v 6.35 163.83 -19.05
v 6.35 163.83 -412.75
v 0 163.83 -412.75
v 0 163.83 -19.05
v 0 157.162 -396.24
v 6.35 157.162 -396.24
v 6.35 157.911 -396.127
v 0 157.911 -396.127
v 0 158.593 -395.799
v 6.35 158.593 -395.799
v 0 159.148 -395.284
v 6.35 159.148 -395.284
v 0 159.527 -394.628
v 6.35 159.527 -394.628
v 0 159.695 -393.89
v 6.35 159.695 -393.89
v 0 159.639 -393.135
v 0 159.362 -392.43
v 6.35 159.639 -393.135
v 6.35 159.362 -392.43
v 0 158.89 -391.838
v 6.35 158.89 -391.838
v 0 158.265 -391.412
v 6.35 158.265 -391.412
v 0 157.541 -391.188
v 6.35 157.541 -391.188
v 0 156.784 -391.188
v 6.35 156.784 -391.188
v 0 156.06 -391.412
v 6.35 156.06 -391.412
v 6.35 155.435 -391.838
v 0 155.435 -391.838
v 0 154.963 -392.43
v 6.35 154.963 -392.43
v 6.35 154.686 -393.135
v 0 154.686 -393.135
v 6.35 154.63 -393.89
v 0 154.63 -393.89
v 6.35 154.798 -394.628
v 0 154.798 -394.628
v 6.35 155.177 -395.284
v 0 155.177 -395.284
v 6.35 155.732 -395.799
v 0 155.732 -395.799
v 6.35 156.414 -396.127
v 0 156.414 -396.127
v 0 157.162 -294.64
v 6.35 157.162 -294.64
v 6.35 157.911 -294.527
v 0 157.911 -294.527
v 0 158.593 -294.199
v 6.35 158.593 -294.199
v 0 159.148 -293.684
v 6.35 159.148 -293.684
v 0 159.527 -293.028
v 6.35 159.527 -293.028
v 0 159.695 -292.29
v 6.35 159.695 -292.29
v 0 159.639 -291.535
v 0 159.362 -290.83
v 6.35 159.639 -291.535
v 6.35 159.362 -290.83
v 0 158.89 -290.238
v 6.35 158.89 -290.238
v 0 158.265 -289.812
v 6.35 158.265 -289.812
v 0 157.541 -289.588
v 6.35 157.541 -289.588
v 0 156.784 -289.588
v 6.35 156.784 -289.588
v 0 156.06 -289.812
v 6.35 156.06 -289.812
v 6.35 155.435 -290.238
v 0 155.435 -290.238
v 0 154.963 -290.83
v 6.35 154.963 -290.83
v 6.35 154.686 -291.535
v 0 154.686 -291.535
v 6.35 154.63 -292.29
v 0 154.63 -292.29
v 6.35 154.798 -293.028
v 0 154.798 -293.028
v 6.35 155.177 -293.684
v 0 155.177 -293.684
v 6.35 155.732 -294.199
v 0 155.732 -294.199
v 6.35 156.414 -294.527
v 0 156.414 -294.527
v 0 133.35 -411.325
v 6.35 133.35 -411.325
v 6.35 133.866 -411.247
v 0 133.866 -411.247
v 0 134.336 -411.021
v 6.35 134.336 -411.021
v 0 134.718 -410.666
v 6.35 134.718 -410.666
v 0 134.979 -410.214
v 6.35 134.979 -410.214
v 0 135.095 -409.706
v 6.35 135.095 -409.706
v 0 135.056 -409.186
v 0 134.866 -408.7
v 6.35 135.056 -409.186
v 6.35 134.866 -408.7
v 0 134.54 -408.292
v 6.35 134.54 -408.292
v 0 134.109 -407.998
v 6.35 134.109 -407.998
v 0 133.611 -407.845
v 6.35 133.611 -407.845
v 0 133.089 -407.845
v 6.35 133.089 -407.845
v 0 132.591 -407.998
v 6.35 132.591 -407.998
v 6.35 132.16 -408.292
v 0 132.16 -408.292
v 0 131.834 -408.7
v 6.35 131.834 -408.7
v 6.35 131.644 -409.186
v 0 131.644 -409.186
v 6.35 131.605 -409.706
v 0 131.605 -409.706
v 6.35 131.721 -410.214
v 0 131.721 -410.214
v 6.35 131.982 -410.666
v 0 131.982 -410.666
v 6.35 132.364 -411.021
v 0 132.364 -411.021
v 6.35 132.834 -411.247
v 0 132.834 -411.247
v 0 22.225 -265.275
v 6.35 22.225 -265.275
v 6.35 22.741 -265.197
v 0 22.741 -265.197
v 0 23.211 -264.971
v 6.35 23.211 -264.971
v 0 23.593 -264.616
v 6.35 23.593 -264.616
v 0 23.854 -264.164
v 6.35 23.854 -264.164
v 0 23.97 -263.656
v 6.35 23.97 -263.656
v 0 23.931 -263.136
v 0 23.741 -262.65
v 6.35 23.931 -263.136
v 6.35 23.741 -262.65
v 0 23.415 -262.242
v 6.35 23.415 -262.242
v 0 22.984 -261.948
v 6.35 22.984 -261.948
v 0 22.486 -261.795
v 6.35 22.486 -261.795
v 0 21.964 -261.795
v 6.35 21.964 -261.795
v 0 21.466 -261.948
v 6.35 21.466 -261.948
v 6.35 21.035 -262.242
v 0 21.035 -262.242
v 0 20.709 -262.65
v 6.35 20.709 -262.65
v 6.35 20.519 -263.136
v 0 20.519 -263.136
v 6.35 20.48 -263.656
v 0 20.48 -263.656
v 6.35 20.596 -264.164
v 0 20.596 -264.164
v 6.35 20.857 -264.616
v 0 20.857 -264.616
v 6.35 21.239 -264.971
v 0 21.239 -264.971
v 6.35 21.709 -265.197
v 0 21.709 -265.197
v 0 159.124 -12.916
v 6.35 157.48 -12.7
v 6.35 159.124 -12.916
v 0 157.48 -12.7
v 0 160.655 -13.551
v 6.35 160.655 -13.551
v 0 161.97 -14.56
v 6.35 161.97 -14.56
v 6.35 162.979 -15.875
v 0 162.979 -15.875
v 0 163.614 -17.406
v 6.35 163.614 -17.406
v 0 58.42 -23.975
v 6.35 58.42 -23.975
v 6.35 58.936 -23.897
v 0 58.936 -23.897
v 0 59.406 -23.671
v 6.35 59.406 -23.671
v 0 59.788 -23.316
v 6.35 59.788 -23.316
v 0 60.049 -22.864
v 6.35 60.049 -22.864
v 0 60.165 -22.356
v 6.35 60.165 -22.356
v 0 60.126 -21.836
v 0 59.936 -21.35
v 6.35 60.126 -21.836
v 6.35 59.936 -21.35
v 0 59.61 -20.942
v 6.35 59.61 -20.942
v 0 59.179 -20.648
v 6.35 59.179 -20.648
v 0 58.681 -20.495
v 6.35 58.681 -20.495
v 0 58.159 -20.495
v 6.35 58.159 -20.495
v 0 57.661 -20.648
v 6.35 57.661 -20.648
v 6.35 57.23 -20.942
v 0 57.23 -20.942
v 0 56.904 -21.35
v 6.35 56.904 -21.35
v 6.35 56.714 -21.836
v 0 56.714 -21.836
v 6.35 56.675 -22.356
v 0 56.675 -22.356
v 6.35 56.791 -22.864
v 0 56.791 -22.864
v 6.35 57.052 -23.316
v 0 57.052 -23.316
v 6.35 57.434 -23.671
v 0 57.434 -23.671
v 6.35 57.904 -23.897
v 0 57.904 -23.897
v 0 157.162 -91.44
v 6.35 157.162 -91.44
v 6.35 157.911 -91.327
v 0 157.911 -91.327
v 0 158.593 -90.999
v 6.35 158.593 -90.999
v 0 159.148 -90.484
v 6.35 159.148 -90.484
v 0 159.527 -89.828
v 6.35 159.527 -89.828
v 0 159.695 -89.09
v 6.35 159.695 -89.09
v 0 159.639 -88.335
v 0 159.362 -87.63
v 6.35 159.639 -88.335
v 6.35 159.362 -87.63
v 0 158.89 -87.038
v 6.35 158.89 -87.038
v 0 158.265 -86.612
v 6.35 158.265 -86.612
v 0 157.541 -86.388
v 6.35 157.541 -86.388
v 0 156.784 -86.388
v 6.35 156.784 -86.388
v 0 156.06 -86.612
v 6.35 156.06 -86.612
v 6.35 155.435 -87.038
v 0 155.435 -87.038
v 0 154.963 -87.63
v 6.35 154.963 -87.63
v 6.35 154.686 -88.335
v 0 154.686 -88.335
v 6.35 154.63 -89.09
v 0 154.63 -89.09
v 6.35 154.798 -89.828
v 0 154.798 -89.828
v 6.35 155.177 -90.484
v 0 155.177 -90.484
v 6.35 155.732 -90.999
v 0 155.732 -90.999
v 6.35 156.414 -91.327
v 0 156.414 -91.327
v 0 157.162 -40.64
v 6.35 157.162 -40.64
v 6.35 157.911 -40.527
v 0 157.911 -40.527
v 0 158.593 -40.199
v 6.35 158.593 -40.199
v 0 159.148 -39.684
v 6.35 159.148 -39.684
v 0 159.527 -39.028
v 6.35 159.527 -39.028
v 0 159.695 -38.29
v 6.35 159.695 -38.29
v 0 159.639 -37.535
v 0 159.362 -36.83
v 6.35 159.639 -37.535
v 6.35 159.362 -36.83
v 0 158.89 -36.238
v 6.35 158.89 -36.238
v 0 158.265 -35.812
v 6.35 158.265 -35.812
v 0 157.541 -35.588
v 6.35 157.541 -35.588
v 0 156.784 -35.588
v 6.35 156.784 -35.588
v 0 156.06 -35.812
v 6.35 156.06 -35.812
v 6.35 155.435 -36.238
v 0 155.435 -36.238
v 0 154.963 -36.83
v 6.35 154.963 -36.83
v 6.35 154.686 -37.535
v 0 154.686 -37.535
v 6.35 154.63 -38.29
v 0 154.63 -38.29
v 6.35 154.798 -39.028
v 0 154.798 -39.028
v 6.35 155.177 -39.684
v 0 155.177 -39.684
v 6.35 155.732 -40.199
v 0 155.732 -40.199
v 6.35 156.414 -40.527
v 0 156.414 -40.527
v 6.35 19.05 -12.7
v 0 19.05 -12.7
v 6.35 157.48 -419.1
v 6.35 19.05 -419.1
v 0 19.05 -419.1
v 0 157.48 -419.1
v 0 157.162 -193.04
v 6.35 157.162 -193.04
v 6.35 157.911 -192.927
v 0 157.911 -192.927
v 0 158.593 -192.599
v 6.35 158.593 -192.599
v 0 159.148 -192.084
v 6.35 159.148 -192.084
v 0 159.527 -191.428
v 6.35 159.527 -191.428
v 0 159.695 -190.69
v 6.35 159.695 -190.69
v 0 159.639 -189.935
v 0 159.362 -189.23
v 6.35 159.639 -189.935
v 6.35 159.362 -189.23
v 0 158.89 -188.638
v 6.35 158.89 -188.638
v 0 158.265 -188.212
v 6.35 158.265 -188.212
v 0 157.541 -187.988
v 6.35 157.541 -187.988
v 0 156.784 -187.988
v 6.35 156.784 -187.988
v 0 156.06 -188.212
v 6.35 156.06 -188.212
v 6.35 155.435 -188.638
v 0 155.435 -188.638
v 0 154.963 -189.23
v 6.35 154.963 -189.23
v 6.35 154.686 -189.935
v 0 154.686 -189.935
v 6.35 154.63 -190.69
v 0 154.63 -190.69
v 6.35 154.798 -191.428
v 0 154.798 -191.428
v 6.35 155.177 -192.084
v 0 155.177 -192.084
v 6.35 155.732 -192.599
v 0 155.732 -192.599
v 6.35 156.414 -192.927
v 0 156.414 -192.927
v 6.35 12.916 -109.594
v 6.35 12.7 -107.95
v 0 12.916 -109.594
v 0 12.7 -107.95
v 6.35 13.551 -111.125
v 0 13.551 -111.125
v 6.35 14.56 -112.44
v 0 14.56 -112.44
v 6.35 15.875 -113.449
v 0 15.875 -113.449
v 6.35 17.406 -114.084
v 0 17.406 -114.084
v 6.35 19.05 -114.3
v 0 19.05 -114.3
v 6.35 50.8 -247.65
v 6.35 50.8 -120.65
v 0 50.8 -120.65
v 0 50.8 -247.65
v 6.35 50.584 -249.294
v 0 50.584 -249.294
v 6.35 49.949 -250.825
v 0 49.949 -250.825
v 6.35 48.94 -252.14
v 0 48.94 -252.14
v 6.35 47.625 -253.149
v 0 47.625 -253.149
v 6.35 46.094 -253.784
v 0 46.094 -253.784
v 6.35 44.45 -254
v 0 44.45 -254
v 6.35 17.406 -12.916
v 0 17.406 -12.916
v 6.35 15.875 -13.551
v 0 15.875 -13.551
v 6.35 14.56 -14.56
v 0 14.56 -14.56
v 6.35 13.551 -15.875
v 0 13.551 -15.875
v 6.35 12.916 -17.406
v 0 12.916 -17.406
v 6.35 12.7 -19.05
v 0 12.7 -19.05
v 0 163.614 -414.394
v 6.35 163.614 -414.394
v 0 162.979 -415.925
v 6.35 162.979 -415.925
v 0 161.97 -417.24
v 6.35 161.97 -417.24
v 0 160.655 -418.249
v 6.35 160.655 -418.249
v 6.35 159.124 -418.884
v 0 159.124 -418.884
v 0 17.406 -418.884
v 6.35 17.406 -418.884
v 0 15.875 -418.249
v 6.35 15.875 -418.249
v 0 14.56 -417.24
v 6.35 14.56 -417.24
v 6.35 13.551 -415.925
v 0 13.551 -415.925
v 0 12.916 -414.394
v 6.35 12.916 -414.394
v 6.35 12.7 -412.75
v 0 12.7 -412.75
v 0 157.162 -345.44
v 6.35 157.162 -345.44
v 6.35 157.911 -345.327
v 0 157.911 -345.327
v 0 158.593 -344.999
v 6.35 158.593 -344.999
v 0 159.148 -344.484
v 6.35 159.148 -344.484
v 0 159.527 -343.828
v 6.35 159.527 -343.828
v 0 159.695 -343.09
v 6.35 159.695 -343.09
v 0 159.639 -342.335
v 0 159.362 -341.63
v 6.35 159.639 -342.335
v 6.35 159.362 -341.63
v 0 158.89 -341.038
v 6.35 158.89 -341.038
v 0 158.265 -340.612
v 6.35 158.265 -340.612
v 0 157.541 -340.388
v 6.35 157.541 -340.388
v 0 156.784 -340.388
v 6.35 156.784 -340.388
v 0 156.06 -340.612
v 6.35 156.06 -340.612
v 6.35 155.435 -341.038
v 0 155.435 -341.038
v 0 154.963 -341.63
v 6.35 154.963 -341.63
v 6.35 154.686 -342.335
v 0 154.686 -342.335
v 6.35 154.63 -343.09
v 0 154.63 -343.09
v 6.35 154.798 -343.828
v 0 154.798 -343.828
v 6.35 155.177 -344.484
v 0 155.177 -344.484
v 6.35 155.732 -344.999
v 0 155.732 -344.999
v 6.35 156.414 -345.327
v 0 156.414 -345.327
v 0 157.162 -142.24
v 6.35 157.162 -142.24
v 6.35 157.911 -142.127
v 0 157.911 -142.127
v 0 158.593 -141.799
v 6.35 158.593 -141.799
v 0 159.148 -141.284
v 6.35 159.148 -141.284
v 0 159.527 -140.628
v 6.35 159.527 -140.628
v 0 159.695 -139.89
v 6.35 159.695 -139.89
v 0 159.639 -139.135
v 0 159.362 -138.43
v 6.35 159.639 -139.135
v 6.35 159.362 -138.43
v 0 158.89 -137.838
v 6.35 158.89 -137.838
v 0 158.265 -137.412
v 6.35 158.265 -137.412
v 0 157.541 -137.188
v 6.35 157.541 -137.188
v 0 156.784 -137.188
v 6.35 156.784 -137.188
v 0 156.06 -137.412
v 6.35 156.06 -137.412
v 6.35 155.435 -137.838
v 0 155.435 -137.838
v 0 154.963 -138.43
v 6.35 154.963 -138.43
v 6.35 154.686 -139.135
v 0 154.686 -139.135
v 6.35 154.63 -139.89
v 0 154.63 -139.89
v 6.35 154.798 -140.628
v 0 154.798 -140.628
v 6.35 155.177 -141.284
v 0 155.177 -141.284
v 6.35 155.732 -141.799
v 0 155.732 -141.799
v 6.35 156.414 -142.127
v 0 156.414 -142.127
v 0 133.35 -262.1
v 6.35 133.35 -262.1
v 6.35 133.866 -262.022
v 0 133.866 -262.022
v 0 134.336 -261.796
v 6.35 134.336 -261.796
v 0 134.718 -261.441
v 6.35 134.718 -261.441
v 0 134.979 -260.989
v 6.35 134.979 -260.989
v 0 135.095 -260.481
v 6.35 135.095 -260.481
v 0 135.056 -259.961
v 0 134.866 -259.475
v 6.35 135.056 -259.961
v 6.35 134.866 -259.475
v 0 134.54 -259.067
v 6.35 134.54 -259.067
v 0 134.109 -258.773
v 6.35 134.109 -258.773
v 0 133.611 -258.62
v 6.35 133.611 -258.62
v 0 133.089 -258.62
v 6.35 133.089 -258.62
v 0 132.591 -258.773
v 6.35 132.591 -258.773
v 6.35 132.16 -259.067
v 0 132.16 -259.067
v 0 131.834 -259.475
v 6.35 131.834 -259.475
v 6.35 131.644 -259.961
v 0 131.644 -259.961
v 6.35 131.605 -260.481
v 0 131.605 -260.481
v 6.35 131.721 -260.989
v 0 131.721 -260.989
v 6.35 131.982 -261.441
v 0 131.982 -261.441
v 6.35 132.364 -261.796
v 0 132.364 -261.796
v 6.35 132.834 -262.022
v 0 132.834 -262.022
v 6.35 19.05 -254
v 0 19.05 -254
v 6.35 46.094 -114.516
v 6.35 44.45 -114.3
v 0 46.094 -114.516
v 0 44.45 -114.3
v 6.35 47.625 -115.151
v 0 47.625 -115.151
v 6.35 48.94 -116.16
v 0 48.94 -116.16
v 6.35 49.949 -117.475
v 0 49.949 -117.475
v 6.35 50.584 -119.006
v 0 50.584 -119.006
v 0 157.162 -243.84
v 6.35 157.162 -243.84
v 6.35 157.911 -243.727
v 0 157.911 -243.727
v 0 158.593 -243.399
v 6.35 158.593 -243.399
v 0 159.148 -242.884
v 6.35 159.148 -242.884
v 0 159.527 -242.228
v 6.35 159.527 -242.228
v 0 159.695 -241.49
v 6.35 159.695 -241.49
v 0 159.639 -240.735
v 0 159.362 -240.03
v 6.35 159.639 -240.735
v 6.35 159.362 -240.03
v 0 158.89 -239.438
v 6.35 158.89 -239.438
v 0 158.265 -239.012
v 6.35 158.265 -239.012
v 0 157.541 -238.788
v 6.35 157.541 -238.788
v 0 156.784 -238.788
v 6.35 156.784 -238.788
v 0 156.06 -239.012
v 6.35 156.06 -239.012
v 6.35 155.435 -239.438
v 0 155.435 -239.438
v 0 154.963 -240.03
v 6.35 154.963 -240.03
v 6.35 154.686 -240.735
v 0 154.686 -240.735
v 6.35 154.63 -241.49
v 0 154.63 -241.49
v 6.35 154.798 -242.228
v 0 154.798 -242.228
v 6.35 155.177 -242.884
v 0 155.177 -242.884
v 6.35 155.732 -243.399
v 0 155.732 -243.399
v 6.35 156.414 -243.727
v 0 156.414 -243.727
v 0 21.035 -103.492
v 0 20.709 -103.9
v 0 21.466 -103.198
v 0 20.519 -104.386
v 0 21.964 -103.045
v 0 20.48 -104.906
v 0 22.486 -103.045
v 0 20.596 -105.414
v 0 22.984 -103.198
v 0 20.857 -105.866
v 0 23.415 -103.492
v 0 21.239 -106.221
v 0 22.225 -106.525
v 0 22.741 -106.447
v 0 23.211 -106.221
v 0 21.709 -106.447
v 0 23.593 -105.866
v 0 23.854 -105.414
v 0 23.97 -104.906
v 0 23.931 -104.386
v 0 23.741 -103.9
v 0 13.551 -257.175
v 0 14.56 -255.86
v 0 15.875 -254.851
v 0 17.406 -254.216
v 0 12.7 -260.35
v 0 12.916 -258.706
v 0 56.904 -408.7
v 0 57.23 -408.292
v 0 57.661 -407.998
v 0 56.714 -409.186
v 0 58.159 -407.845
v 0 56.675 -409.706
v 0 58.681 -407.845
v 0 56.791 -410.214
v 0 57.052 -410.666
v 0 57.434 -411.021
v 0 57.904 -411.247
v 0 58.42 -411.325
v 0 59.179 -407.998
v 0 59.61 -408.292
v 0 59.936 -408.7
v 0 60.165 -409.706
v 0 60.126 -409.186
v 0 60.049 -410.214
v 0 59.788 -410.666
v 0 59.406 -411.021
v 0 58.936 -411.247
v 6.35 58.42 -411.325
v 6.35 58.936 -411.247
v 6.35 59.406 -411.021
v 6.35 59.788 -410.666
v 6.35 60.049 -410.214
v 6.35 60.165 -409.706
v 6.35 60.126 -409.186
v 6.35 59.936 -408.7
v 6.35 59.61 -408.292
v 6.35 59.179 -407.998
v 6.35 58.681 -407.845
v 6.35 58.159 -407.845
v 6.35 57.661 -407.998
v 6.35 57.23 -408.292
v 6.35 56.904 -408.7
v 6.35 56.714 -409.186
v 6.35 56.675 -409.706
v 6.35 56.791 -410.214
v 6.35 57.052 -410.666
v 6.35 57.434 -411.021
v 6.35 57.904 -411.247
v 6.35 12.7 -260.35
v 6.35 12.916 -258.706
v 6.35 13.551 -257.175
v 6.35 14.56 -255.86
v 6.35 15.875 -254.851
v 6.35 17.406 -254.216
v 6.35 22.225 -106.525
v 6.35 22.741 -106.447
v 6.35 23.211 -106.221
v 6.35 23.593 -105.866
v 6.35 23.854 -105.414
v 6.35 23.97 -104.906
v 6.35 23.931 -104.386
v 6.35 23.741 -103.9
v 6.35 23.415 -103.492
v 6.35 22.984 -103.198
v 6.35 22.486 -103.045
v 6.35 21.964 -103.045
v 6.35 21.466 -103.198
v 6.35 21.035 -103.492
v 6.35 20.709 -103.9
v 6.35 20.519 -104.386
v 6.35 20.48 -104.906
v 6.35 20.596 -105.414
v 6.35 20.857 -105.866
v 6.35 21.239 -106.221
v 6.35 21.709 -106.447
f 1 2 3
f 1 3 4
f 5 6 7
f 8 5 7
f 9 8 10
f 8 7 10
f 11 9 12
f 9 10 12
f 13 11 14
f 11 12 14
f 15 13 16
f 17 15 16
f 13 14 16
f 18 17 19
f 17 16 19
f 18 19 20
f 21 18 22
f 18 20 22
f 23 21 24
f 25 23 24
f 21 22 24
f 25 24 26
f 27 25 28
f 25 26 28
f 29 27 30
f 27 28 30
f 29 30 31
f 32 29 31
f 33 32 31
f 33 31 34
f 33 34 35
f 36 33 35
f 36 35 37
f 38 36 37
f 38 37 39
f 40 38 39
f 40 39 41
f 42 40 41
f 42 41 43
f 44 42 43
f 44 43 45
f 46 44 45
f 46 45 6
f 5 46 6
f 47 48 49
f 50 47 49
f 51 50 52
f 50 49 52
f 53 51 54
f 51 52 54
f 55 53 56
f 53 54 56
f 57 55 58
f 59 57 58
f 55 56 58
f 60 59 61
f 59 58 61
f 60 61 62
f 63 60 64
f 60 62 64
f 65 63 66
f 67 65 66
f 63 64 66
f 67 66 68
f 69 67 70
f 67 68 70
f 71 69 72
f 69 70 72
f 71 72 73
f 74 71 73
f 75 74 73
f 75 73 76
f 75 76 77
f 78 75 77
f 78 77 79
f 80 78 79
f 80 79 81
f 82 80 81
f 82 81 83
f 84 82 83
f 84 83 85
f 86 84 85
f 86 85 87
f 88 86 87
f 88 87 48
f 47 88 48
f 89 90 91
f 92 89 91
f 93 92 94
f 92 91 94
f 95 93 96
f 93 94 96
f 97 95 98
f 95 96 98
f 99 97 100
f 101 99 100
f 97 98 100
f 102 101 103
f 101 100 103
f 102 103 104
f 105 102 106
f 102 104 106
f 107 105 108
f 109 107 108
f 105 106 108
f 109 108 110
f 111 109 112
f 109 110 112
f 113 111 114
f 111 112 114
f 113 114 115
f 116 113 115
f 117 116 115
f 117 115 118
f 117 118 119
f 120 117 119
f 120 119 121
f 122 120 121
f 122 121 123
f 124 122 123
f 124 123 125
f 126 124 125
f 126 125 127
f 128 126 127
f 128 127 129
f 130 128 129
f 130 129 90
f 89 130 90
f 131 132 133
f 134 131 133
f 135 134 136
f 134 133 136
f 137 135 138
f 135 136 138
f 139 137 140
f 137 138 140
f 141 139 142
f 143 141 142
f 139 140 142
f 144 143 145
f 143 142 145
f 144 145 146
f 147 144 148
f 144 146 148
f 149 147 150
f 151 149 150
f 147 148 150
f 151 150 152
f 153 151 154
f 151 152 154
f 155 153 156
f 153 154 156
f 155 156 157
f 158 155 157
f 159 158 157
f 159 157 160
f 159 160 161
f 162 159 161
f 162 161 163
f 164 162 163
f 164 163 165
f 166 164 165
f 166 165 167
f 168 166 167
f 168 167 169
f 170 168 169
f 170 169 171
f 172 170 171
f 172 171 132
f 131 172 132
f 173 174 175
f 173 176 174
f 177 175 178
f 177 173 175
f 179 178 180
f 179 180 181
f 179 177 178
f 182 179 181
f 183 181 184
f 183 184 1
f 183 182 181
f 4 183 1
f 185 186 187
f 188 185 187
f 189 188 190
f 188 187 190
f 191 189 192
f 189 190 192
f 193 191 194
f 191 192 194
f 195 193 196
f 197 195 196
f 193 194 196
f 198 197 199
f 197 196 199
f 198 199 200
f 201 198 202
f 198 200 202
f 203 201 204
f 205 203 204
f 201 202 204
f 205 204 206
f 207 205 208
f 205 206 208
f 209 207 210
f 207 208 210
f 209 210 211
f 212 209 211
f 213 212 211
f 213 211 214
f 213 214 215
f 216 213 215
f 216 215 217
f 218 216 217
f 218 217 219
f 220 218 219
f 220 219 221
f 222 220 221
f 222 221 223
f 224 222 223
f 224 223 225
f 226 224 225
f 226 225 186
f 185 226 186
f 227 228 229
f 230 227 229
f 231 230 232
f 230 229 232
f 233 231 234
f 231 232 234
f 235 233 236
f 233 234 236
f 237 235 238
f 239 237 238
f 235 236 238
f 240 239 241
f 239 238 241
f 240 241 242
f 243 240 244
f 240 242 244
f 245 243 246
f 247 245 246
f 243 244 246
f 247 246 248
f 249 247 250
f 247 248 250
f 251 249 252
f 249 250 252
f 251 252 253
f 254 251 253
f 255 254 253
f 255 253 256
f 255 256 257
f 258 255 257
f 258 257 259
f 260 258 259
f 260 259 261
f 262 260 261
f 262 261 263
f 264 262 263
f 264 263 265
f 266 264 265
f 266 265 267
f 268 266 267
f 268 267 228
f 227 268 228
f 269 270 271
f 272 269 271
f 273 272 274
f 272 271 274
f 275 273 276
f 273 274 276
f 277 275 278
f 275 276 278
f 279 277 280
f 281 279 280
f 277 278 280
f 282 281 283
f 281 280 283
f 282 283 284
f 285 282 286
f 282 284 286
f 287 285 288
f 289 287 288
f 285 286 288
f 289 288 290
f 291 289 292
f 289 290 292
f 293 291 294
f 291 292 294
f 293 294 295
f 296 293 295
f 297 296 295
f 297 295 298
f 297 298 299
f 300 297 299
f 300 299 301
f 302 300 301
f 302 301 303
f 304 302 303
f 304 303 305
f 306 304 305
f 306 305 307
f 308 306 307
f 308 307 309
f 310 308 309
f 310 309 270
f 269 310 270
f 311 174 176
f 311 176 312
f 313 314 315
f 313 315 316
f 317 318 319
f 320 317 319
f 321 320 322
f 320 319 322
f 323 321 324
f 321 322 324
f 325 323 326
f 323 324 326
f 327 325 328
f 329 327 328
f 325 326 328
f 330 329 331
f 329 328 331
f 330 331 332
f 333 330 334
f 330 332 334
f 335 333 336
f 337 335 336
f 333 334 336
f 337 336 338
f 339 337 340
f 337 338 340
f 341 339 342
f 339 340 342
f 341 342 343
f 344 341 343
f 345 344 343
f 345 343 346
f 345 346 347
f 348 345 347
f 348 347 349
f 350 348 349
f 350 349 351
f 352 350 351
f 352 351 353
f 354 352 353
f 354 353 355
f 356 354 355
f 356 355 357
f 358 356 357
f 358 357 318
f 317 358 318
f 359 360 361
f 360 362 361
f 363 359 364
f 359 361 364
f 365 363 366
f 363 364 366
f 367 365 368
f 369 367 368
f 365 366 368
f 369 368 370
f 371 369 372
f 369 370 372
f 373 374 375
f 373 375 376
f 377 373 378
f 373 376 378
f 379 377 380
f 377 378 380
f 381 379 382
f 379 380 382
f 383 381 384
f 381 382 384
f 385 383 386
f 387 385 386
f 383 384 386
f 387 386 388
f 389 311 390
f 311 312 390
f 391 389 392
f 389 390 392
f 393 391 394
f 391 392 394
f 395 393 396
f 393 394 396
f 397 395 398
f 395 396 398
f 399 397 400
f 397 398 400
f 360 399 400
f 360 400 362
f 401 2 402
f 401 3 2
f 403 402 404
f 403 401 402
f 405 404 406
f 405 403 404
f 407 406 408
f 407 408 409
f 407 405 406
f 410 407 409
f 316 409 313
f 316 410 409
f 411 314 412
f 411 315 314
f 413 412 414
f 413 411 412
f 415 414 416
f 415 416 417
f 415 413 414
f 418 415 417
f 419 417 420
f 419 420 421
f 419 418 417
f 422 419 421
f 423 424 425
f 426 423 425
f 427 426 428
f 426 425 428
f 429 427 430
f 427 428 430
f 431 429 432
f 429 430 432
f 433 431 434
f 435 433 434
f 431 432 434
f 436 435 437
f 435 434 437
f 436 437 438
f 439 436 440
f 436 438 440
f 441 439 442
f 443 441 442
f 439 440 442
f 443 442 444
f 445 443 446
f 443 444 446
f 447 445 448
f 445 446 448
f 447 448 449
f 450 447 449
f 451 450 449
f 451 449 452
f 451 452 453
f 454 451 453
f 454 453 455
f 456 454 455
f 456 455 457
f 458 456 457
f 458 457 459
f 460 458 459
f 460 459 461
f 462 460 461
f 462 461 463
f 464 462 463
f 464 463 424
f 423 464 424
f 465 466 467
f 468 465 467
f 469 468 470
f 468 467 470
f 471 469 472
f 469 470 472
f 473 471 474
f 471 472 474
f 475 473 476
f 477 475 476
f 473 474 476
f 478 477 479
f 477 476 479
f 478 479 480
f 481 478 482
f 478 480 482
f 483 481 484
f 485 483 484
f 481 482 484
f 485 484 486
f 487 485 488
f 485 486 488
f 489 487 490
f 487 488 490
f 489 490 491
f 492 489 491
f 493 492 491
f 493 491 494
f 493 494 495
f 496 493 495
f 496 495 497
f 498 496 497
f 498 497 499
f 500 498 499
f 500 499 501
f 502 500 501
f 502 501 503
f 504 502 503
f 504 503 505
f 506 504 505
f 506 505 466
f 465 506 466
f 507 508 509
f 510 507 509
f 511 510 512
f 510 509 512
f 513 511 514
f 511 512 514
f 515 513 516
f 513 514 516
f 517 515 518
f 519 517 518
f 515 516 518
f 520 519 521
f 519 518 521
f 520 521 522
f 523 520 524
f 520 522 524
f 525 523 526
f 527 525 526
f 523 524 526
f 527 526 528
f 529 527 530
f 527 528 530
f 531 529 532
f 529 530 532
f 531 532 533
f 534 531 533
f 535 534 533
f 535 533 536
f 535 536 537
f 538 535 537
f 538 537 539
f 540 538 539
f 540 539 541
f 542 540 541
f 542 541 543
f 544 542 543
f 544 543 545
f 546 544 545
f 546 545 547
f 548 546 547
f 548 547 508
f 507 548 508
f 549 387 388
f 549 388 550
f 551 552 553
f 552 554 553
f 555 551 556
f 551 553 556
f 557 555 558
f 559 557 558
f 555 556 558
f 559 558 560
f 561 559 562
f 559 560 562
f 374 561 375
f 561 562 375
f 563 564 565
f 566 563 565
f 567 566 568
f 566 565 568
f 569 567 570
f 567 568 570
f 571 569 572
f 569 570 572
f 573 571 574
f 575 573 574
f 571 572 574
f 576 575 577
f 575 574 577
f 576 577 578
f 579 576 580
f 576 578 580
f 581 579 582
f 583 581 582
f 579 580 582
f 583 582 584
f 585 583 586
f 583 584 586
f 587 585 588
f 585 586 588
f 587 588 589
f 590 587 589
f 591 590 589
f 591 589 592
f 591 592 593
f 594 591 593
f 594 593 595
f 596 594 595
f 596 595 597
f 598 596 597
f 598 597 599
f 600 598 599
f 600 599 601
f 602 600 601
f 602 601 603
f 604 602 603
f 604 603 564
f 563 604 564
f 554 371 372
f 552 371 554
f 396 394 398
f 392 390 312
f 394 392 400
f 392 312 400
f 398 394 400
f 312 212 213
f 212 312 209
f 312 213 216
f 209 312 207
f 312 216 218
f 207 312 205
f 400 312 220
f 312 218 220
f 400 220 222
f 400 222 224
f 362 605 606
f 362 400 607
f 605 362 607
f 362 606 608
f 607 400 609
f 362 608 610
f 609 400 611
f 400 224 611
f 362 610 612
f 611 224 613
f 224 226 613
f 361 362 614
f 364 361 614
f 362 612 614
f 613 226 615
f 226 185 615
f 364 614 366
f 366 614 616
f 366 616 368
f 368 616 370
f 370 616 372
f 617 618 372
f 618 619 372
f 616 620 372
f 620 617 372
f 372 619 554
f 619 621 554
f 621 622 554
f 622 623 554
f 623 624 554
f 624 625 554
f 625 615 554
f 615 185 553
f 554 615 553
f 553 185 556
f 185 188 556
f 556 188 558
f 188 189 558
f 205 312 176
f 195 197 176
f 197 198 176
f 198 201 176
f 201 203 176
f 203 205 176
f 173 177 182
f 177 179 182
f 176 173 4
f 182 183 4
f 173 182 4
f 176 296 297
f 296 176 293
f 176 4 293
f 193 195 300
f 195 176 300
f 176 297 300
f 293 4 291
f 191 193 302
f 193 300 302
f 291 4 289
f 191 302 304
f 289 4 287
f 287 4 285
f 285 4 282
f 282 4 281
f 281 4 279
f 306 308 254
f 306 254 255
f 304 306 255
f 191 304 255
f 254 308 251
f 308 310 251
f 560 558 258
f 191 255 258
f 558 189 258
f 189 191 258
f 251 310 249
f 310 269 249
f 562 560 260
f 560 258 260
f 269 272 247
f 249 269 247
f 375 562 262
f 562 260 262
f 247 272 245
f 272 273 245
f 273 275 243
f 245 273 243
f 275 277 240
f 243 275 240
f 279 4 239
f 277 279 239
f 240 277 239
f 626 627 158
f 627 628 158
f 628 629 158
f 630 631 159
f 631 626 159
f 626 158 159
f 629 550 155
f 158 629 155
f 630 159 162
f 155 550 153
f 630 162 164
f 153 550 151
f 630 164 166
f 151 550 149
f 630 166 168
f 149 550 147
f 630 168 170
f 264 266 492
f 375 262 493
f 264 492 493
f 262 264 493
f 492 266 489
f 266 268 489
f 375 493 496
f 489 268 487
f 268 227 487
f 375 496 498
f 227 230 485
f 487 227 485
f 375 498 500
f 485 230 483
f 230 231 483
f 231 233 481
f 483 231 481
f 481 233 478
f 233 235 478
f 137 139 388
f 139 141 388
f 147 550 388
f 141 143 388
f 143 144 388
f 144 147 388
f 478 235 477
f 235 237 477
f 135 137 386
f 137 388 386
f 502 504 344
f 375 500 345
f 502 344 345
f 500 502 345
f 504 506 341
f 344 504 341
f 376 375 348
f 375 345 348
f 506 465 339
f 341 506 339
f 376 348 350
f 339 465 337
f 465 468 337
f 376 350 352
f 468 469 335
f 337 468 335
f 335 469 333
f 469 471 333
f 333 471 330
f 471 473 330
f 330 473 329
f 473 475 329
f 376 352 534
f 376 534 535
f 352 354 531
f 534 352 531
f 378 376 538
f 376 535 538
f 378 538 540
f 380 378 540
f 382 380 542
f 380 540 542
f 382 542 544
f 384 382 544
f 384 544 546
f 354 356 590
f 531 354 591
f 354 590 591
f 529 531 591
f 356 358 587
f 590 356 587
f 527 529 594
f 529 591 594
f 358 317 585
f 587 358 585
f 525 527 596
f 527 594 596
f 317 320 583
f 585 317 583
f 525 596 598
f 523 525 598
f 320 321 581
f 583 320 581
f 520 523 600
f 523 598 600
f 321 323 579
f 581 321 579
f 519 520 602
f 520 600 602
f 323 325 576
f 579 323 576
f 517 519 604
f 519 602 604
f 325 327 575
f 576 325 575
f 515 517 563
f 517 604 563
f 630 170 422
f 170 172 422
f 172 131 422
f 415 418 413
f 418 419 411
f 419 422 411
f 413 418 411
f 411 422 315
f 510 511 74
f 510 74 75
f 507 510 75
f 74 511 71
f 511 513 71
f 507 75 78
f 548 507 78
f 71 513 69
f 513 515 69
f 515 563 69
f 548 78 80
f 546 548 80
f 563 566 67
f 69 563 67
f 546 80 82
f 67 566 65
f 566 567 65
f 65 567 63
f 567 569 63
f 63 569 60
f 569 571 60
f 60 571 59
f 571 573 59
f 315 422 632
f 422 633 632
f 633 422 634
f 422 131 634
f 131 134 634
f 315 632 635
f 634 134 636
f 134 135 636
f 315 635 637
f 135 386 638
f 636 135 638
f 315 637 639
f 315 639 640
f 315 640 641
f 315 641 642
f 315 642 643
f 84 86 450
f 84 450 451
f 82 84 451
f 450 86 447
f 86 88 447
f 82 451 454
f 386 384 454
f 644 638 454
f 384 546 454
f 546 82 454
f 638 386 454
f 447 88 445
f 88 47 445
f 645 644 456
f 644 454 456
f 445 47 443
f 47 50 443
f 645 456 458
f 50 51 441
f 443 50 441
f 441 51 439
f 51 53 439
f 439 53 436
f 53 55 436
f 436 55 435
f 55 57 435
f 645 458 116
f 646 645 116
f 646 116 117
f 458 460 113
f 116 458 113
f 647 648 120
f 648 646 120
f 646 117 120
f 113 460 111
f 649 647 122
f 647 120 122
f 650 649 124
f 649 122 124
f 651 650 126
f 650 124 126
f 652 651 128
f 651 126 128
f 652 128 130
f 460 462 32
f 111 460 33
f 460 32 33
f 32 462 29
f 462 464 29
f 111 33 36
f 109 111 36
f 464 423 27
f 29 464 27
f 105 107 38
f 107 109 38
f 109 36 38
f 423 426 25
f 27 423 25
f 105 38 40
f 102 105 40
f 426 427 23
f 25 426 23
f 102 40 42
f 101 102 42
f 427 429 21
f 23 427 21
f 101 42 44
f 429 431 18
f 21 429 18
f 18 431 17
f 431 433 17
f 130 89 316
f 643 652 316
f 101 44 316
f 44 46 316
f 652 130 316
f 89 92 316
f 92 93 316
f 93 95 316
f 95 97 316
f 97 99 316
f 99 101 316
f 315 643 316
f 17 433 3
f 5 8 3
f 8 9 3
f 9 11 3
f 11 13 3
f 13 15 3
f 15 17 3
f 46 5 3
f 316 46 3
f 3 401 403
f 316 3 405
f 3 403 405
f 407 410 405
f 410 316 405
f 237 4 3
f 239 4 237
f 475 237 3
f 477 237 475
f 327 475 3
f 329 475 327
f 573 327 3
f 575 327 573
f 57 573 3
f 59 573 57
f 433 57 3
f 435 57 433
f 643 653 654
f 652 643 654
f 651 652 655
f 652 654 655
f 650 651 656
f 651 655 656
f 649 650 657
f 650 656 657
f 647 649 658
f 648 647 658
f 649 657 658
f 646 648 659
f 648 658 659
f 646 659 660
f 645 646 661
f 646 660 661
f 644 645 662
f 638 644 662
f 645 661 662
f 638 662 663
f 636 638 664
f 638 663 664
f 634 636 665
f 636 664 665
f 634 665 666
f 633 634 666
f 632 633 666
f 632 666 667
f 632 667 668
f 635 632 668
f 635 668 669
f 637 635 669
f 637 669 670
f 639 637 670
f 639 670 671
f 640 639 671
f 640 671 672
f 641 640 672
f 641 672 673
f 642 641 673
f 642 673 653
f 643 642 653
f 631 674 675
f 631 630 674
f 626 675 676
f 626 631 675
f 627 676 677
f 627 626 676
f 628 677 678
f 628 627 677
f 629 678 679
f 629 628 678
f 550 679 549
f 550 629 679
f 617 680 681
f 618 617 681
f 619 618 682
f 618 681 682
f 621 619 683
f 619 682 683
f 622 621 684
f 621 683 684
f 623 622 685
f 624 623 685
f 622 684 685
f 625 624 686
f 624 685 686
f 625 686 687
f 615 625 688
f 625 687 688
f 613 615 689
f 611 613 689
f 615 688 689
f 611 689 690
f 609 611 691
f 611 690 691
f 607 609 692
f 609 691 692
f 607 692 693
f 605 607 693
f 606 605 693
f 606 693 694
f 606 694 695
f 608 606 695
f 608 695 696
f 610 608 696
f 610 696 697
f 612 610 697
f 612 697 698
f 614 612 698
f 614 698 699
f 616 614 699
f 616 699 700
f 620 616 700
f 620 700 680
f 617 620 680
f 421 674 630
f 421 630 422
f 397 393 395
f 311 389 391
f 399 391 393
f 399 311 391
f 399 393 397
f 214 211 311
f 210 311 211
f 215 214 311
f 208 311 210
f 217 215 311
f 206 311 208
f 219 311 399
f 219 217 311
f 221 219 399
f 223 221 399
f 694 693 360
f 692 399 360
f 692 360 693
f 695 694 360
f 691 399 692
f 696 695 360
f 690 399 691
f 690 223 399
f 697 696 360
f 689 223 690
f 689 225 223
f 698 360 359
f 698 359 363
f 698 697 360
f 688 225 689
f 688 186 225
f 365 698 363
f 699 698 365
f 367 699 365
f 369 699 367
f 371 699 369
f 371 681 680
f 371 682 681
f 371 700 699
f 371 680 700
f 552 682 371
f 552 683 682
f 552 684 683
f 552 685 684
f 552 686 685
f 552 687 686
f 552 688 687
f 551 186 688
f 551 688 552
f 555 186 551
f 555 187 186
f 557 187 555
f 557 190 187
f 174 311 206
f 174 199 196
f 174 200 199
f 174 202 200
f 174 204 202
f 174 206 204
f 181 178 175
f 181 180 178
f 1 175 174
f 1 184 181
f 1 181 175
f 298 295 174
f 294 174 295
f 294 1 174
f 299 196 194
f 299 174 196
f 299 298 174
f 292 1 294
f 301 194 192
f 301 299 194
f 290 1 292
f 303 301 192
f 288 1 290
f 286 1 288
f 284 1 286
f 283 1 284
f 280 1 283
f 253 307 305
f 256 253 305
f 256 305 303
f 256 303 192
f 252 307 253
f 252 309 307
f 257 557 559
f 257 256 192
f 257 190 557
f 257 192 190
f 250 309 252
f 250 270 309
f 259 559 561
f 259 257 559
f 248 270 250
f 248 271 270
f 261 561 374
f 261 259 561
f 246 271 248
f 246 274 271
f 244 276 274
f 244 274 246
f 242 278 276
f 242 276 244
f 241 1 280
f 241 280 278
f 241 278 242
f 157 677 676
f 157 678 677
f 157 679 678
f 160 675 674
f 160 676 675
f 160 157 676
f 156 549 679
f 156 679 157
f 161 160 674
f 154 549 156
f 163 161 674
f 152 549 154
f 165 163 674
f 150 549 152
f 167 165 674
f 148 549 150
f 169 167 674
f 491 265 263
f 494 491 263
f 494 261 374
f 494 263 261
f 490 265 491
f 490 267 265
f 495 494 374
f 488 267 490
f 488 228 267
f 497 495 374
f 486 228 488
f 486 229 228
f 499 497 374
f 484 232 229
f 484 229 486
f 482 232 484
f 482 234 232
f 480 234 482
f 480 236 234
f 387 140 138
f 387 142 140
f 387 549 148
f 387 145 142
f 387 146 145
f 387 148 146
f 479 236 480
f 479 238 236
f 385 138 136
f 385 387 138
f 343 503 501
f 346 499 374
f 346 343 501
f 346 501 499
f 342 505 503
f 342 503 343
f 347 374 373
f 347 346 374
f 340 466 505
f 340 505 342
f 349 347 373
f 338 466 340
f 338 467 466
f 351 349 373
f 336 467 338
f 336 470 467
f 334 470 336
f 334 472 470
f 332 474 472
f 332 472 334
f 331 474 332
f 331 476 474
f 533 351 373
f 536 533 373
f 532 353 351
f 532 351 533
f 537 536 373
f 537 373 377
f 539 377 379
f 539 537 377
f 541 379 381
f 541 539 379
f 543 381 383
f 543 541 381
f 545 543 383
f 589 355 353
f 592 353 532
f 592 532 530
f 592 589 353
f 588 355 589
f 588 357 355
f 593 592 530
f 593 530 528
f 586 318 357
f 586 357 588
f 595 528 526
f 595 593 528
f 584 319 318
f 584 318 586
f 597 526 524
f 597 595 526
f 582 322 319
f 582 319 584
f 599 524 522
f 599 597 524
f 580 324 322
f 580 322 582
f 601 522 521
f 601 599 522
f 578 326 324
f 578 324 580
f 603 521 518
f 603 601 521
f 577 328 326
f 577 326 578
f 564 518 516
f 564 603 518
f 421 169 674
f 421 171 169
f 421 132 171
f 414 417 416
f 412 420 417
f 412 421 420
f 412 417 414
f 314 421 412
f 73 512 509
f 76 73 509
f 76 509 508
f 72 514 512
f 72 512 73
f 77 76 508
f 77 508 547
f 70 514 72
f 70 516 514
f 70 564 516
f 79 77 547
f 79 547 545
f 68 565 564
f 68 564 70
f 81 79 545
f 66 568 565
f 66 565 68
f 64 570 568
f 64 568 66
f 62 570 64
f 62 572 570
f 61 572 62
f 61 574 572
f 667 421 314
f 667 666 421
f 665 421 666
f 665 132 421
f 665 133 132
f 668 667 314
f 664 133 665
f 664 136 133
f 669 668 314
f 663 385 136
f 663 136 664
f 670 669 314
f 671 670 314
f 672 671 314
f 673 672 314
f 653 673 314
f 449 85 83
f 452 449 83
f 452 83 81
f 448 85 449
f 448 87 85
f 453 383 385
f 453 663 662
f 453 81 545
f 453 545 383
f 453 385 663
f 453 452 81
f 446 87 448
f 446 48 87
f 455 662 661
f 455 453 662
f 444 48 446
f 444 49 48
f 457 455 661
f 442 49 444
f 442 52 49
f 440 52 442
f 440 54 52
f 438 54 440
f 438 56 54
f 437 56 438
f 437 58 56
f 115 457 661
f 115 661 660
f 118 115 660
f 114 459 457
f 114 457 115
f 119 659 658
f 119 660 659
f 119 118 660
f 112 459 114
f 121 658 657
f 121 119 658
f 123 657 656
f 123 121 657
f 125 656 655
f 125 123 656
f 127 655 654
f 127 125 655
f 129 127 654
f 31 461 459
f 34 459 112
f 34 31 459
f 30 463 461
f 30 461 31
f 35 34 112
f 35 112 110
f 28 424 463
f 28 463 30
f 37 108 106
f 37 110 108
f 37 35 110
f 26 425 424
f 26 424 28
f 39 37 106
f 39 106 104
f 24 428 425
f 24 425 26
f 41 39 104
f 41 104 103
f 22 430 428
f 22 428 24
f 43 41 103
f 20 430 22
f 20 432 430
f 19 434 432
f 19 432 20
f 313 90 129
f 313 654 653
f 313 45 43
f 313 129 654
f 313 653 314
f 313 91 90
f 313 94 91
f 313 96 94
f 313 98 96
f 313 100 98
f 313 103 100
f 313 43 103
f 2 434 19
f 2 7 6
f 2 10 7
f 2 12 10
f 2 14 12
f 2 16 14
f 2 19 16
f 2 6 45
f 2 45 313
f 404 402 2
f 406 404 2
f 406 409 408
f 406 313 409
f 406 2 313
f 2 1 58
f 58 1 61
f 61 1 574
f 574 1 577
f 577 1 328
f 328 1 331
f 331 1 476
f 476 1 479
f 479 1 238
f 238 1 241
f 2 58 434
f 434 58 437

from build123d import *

# Parameters (mm, degrees)
BOSS_EXTRUDE1_DEPTH = 6.35
SKETCH3_R           = 3.96875
CUT_EXTRUDE1_DEPTH  = 7.35
SKETCH5_W           = 6.35
SKETCH5_H           = 12.7
CUT_EXTRUDE3_DEPTH  = 7.35
LPATTERN1_COUNT     = 16
LPATTERN1_PITCH     = 25.4
SKETCH6_W           = 6.35
SKETCH6_H           = 12.7
CUT_EXTRUDE4_DEPTH  = 7.35
LPATTERN2_COUNT     = 11
LPATTERN2_PITCH     = 25.4
SKETCH7_W           = 6.35
SKETCH7_H           = 12.7
SKETCH7_W_2         = 12.7
SKETCH7_H_2         = 6.35
CUT_EXTRUDE5_DEPTH  = 7.35
CUT_EXTRUDE6_DEPTH  = 7.35
LPATTERN3_COUNT     = 10
LPATTERN3_PITCH     = 25.4
SKETCH9_W           = 12.7
SKETCH9_H           = 6.35
CUT_EXTRUDE7_DEPTH  = 7.35
LPATTERN4_COUNT     = 8
LPATTERN4_PITCH     = 25.4
SKETCH10_R          = 3.175
CUT_EXTRUDE8_DEPTH  = 7.35
SKETCH11_R          = 3.96875
CUT_EXTRUDE9_DEPTH  = 7.35
SKETCH12_W          = 6.35
SKETCH12_H          = 12.7
CUT_EXTRUDE13_DEPTH = 7.35
CUT_EXTRUDE15_DEPTH = 7.35
CUT_EXTRUDE16_DEPTH = 7.35
SKETCH17_W          = 12.7
SKETCH17_H          = 6.35
CUT_EXTRUDE17_DEPTH = 7.35
LPATTERN5_COUNT     = 17
LPATTERN5_PITCH     = 25.4
LPATTERN6_COUNT     = 2
LPATTERN6_PITCH     = 120.65
SKETCH18_W          = 12.7
SKETCH18_H          = 6.35
CUT_EXTRUDE18_DEPTH = 7.35
LPATTERN7_COUNT     = 5
LPATTERN7_PITCH     = 25.4
CUT_EXTRUDE19_DEPTH = 7.35
SKETCH20_W          = 101.6
SKETCH20_H          = 57.15
CUT_EXTRUDE20_DEPTH = 7.35
CUT_EXTRUDE21_DEPTH = 7.35
CUT_EXTRUDE22_DEPTH = 7.35
BOSS_EXTRUDE4_DEPTH = 6.35
BOSS_EXTRUDE5_DEPTH = 6.35
SKETCH29_R          = 2.54
CUT_EXTRUDE23_DEPTH = 7.35
SKETCH30_R          = 1.75
CUT_EXTRUDE24_DEPTH = 7.35
SKETCH31_R          = 1.75
CUT_EXTRUDE25_DEPTH = 7.35
FILLET2_R           = 6.35


with BuildPart() as part:
    # Sketch2 → Boss-Extrude1 (new body)
    with BuildSketch(Plane(origin=(0, 0, 0), x_dir=(0, 0, -1), z_dir=(1, 0, 0))):
        Polygon((0, 0), (0, 294.450076882), (215.9, 419.1), (431.8, 419.1), (431.8, 0), (241.3, 0), (241.3, 38.1), (127, 38.1), (127, 0), align=None)
    extrude(amount=BOSS_EXTRUDE1_DEPTH)

    # Sketch3 → Cut-Extrude1 (cut, through all)
    with BuildSketch(Plane(origin=(6.35, 0, 0), x_dir=(0, 0, -1), z_dir=(1, 0, 0))):
        with Locations((63.5, 38.1)):
            Circle(SKETCH3_R)
        with Locations((368.3, 38.1)):
            Circle(SKETCH3_R)
    extrude(amount=-CUT_EXTRUDE1_DEPTH, mode=Mode.SUBTRACT)

    # Sketch5 → Cut-Extrude3 (cut, through all)
    with BuildSketch(Plane(origin=(6.35, 0, 0), x_dir=(0, 0, -1), z_dir=(1, 0, 0))):
        with Locations((428.625, 19.05)):
            Rectangle(SKETCH5_W, SKETCH5_H)
    cut_extrude3 = extrude(amount=-CUT_EXTRUDE3_DEPTH, mode=Mode.SUBTRACT)

    # LPattern1: Cut-Extrude3 ×16
    with Locations(*[(0, i * LPATTERN1_PITCH, 0) for i in range(1, LPATTERN1_COUNT)]):
        add(cut_extrude3, mode=Mode.SUBTRACT)

    # Sketch6 → Cut-Extrude4 (cut, through all)
    with BuildSketch(Plane(origin=(6.35, 0, 0), x_dir=(0, 0, -1), z_dir=(1, 0, 0))):
        with Locations((3.175, 19.05)):
            Rectangle(SKETCH6_W, SKETCH6_H)
    cut_extrude4 = extrude(amount=-CUT_EXTRUDE4_DEPTH, mode=Mode.SUBTRACT)

    # LPattern2: Cut-Extrude4 ×11
    with Locations(*[(0, i * LPATTERN2_PITCH, 0) for i in range(1, LPATTERN2_COUNT)]):
        add(cut_extrude4, mode=Mode.SUBTRACT)

    # Sketch7 → Cut-Extrude5 (cut, through all)
    with BuildSketch(Plane(origin=(6.35, 0, 0), x_dir=(0, 0, -1), z_dir=(1, 0, 0))):
        with Locations((123.825, 19.05)):
            Rectangle(SKETCH7_W, SKETCH7_H)
        with Locations((133.35, 41.275)):
            Rectangle(SKETCH7_W_2, SKETCH7_H_2)
        with Locations((158.75, 41.275)):
            Rectangle(SKETCH7_W_2, SKETCH7_H_2)
        with Locations((184.15, 41.275)):
            Rectangle(SKETCH7_W_2, SKETCH7_H_2)
        with Locations((244.475, 19.05)):
            Rectangle(SKETCH7_W, SKETCH7_H)
        with Locations((209.55, 41.275)):
            Rectangle(SKETCH7_W_2, SKETCH7_H_2)
        with Locations((234.95, 41.275)):
            Rectangle(SKETCH7_W_2, SKETCH7_H_2)
    extrude(amount=-CUT_EXTRUDE5_DEPTH, mode=Mode.SUBTRACT)

    # Sketch8 → Cut-Extrude6 (cut, through all)
    with BuildSketch(Plane(origin=(6.35, 0, 0), x_dir=(0, 0, -1), z_dir=(1, 0, 0))):
        Polygon((201.93507044, 411.037344159), (212.933593068, 417.387344159), (216.108593068, 411.888082845), (205.11007044, 405.538082845), align=None)
    cut_extrude6 = extrude(amount=-CUT_EXTRUDE6_DEPTH, mode=Mode.SUBTRACT)

    # LPattern3: Cut-Extrude6 ×10
    with Locations(*[Vector(0, -0.5, 0.866025404) * (i * LPATTERN3_PITCH) for i in range(1, LPATTERN3_COUNT)]):
        add(cut_extrude6, mode=Mode.SUBTRACT)

    # Sketch9 → Cut-Extrude7 (cut, through all)
    with BuildSketch(Plane(origin=(6.35, 0, 0), x_dir=(0, 0, -1), z_dir=(1, 0, 0))):
        with Locations((412.75, 415.925)):
            Rectangle(SKETCH9_W, SKETCH9_H)
    cut_extrude7 = extrude(amount=-CUT_EXTRUDE7_DEPTH, mode=Mode.SUBTRACT)

    # LPattern4: Cut-Extrude7 ×8
    with Locations(*[(0, 0, i * LPATTERN4_PITCH) for i in range(1, LPATTERN4_COUNT)]):
        add(cut_extrude7, mode=Mode.SUBTRACT)

    # Sketch10 → Cut-Extrude8 (cut, through all)
    with BuildSketch(Plane(origin=(6.35, 0, 0), x_dir=(0, 0, -1), z_dir=(1, 0, 0))):
        with Locations((222.25, 273.05)):
            Circle(SKETCH10_R)
        with Locations((222.25, 57.15)):
            Circle(SKETCH10_R)
        with Locations((146.05, 57.15)):
            Circle(SKETCH10_R)
        with Locations((146.05, 273.05)):
            Circle(SKETCH10_R)
    extrude(amount=-CUT_EXTRUDE8_DEPTH, mode=Mode.SUBTRACT)

    # Sketch11 → Cut-Extrude9 (cut, through all)
    with BuildSketch(Plane(origin=(6.35, 0, 0), x_dir=(0, 0, -1), z_dir=(1, 0, 0))):
        with Locations((38.1, 260.35)):
            Circle(SKETCH11_R)
        with Locations((266.7, 260.35)):
            Circle(SKETCH11_R)
    extrude(amount=-CUT_EXTRUDE9_DEPTH, mode=Mode.SUBTRACT)

    # Sketch12 → Cut-Extrude13 (cut, through all)
    with BuildSketch(Plane(origin=(6.35, 0, 0), x_dir=(0, 0, -1), z_dir=(1, 0, 0))):
        with Locations((123.825, 44.45)):
            Rectangle(SKETCH12_W, SKETCH12_H)
        with Locations((123.825, 69.85)):
            Rectangle(SKETCH12_W, SKETCH12_H)
        with Locations((123.825, 95.25)):
            Rectangle(SKETCH12_W, SKETCH12_H)
        with Locations((123.825, 120.65)):
            Rectangle(SKETCH12_W, SKETCH12_H)
    cut_extrude13 = extrude(amount=-CUT_EXTRUDE13_DEPTH, mode=Mode.SUBTRACT)

    # Sketch14 → Cut-Extrude15 (cut, through all)
    with BuildSketch(Plane(origin=(6.35, 0, 0), x_dir=(0, 0, -1), z_dir=(1, 0, 0))):
        Polygon((36.957231019, 315.787344159), (47.955753647, 322.137344159), (51.130753647, 316.638082845), (40.132231019, 310.288082845), align=None)
        Polygon((80.951321531, 341.187344159), (91.949844159, 347.537344159), (95.124844159, 342.038082845), (84.126321531, 335.688082845), align=None)
    extrude(amount=-CUT_EXTRUDE15_DEPTH, mode=Mode.SUBTRACT)

    # Sketch15 → Cut-Extrude16 (cut, through all)
    with BuildSketch(Plane(origin=(6.35, 0, 0), x_dir=(0, 0, -1), z_dir=(1, 0, 0))):
        with BuildLine():
            Line((62.129276275, 322.988082845), (31.558579521, 305.338082845))
            ThreePointArc((31.558579521, 305.338082845), (51.535904978, 302.314952438), (62.501260575, 319.285333297))
            ThreePointArc((62.501260575, 319.285333297), (62.408031035, 321.146027155), (62.129276275, 322.988082845))
        make_face()
        with BuildLine():
            Line((103.698495657, 346.988082845), (73.127798903, 329.338082845))
            ThreePointArc((73.127798903, 329.338082845), (93.10512436, 326.314952438), (104.070479957, 343.285333297))
            ThreePointArc((104.070479957, 343.285333297), (103.977250417, 345.146027155), (103.698495657, 346.988082845))
        make_face()
    extrude(amount=-CUT_EXTRUDE16_DEPTH, mode=Mode.SUBTRACT)

    # Sketch17 → Cut-Extrude17 (cut, through all)
    with BuildSketch(Plane(origin=(6.35, 0, 0), x_dir=(0, 0, -1), z_dir=(1, 0, 0))):
        with Locations((25.4, 142.875)):
            Rectangle(SKETCH17_W, SKETCH17_H)
    cut_extrude17 = extrude(amount=-CUT_EXTRUDE17_DEPTH, mode=Mode.SUBTRACT)

    # LPattern5: Cut-Extrude17 ×17
    with Locations(*[(0, 0, -i * LPATTERN5_PITCH) for i in range(1, LPATTERN5_COUNT)]):
        add(cut_extrude17, mode=Mode.SUBTRACT)

    # LPattern6: Cut-Extrude13 ×2
    with Locations(*[(0, 0, -i * LPATTERN6_PITCH) for i in range(1, LPATTERN6_COUNT)]):
        add(cut_extrude13, mode=Mode.SUBTRACT)

    # Sketch18 → Cut-Extrude18 (cut, through all)
    with BuildSketch(Plane(origin=(6.35, 0, 0), x_dir=(0, 0, -1), z_dir=(1, 0, 0))):
        with Locations((133.35, 117.475)):
            Rectangle(SKETCH18_W, SKETCH18_H)
    cut_extrude18 = extrude(amount=-CUT_EXTRUDE18_DEPTH, mode=Mode.SUBTRACT)

    # LPattern7: Cut-Extrude18 ×5
    with Locations(*[(0, 0, -i * LPATTERN7_PITCH) for i in range(1, LPATTERN7_COUNT)]):
        add(cut_extrude18, mode=Mode.SUBTRACT)

    # Sketch19 → Cut-Extrude19 (cut, through all)
    with BuildSketch(Plane(origin=(6.35, 0, 0), x_dir=(0, 0, -1), z_dir=(1, 0, 0))):
        Polygon((25.4, 279.785380045), (222.705909488, 393.7), (406.4, 393.7), (406.4, 165.1), (25.4, 165.1), align=None)
    extrude(amount=-CUT_EXTRUDE19_DEPTH, mode=Mode.SUBTRACT)

    # Sketch20 → Cut-Extrude20 (cut, through all)
    with BuildSketch(Plane(origin=(6.35, 0, 0), x_dir=(0, 0, -1), z_dir=(1, 0, 0))):
        with Locations((184.15, 79.375)):
            Rectangle(SKETCH20_W, SKETCH20_H)
    extrude(amount=-CUT_EXTRUDE20_DEPTH, mode=Mode.SUBTRACT)

    # Sketch21 → Cut-Extrude21 (cut, through all)
    with BuildSketch(Plane(origin=(6.35, 0, 0), x_dir=(0, 0, -1), z_dir=(1, 0, 0))):
        Polygon((266.7, 25.4), (308.202954744, 25.4), (406.4, 82.094090512), (406.4, 133.35), (266.7, 133.35), align=None)
        Polygon((25.4, 133.35), (25.4, 82.094090512), (101.6, 38.1), (101.6, 133.35), align=None)
        Polygon((25.4, 38.1), (25.4, 25.4), (47.397045256, 25.4), align=None)
    extrude(amount=-CUT_EXTRUDE21_DEPTH, mode=Mode.SUBTRACT)

    # Sketch22 → Cut-Extrude22 (cut, through all)
    with BuildSketch(Plane(origin=(6.35, 0, 0), x_dir=(0, 0, -1), z_dir=(1, 0, 0))):
        Polygon((384.402954744, 25.4), (406.4, 38.1), (406.4, 25.4), align=None)
    extrude(amount=-CUT_EXTRUDE22_DEPTH, mode=Mode.SUBTRACT)

    # Sketch26 → Boss-Extrude4 (add, through all)
    with BuildSketch(Plane(origin=(6.35, 0, 0), x_dir=(0, 0, -1), z_dir=(1, 0, 0))):
        Polygon((266.7, 133.35), (266.7, 126.280871047), (278.944090512, 133.35), align=None)
        Polygon((89.355909488, 133.35), (101.6, 126.280871047), (101.6, 133.35), align=None)
        Polygon((266.7, 32.469128953), (278.944090512, 25.4), (266.7, 25.4), align=None)
        Polygon((133.35, 107.95), (133.35, 100.880871047), (145.594090512, 107.95), align=None)
        Polygon((234.95, 107.95), (222.705909488, 107.95), (234.95, 100.880871047), align=None)
        Polygon((133.35, 50.8), (145.594090512, 50.8), (133.35, 57.869128953), align=None)
        Polygon((234.95, 50.8), (222.705909488, 50.8), (234.95, 57.869128953), align=None)
    extrude(amount=-BOSS_EXTRUDE4_DEPTH)


with BuildPart() as body_2:
    # Sketch27 → Boss-Extrude5 (new body)
    with BuildSketch(Plane(origin=(6.35, 0, 0), x_dir=(0, 0, -1), z_dir=(1, 0, 0))):
        Polygon((12.7, 163.83), (12.7, 12.7), (114.3, 12.7), (114.3, 50.8), (254, 50.8), (254, 12.7), (419.1, 12.7), (419.1, 163.83), align=None)
    extrude(amount=-BOSS_EXTRUDE5_DEPTH)

    # Sketch29 → Cut-Extrude23 (cut, through all)
    with BuildSketch(Plane(origin=(6.35, 0, 0), x_dir=(0, 0, -1), z_dir=(1, 0, 0))):
        with Locations((38.1, 157.1625)):
            Circle(SKETCH29_R)
        with Locations((88.9, 157.1625)):
            Circle(SKETCH29_R)
        with Locations((139.7, 157.1625)):
            Circle(SKETCH29_R)
        with Locations((190.5, 157.1625)):
            Circle(SKETCH29_R)
        with Locations((241.3, 157.1625)):
            Circle(SKETCH29_R)
        with Locations((292.1, 157.1625)):
            Circle(SKETCH29_R)
        with Locations((342.9, 157.1625)):
            Circle(SKETCH29_R)
        with Locations((393.7, 157.1625)):
            Circle(SKETCH29_R)
    extrude(amount=-CUT_EXTRUDE23_DEPTH, mode=Mode.SUBTRACT)

    # Sketch30 → Cut-Extrude24 (cut, through all)
    with BuildSketch(Plane(origin=(6.35, 0, 0), x_dir=(0, 0, -1), z_dir=(1, 0, 0))):
        with Locations((22.225, 58.42)):
            Circle(SKETCH30_R)
        with Locations((104.775, 22.225)):
            Circle(SKETCH30_R)
        with Locations((263.525, 22.225)):
            Circle(SKETCH30_R)
        with Locations((409.575, 58.42)):
            Circle(SKETCH30_R)
    extrude(amount=-CUT_EXTRUDE24_DEPTH, mode=Mode.SUBTRACT)

    # Sketch31 → Cut-Extrude25 (cut, through all)
    with BuildSketch(Plane(origin=(6.35, 0, 0), x_dir=(0, 0, -1), z_dir=(1, 0, 0))):
        with Locations((260.35, 133.35)):
            Circle(SKETCH31_R)
        with Locations((409.575, 133.35)):
            Circle(SKETCH31_R)
    extrude(amount=-CUT_EXTRUDE25_DEPTH, mode=Mode.SUBTRACT)

    # Fillet2
    fillet2_edges = [body_2.edges().sort_by_distance(p)[0] for p in [
        (3.175, 163.83, -419.1),
        (3.175, 12.7, -419.1),
        (3.175, 12.7, -254),
        (3.175, 50.8, -254),
        (3.175, 50.8, -114.3),
        (3.175, 12.7, -114.3),
        (3.175, 12.7, -12.7),
        (3.175, 163.83, -12.7),
    ]]
    fillet(fillet2_edges, radius=FILLET2_R)


solid = body_2.part
